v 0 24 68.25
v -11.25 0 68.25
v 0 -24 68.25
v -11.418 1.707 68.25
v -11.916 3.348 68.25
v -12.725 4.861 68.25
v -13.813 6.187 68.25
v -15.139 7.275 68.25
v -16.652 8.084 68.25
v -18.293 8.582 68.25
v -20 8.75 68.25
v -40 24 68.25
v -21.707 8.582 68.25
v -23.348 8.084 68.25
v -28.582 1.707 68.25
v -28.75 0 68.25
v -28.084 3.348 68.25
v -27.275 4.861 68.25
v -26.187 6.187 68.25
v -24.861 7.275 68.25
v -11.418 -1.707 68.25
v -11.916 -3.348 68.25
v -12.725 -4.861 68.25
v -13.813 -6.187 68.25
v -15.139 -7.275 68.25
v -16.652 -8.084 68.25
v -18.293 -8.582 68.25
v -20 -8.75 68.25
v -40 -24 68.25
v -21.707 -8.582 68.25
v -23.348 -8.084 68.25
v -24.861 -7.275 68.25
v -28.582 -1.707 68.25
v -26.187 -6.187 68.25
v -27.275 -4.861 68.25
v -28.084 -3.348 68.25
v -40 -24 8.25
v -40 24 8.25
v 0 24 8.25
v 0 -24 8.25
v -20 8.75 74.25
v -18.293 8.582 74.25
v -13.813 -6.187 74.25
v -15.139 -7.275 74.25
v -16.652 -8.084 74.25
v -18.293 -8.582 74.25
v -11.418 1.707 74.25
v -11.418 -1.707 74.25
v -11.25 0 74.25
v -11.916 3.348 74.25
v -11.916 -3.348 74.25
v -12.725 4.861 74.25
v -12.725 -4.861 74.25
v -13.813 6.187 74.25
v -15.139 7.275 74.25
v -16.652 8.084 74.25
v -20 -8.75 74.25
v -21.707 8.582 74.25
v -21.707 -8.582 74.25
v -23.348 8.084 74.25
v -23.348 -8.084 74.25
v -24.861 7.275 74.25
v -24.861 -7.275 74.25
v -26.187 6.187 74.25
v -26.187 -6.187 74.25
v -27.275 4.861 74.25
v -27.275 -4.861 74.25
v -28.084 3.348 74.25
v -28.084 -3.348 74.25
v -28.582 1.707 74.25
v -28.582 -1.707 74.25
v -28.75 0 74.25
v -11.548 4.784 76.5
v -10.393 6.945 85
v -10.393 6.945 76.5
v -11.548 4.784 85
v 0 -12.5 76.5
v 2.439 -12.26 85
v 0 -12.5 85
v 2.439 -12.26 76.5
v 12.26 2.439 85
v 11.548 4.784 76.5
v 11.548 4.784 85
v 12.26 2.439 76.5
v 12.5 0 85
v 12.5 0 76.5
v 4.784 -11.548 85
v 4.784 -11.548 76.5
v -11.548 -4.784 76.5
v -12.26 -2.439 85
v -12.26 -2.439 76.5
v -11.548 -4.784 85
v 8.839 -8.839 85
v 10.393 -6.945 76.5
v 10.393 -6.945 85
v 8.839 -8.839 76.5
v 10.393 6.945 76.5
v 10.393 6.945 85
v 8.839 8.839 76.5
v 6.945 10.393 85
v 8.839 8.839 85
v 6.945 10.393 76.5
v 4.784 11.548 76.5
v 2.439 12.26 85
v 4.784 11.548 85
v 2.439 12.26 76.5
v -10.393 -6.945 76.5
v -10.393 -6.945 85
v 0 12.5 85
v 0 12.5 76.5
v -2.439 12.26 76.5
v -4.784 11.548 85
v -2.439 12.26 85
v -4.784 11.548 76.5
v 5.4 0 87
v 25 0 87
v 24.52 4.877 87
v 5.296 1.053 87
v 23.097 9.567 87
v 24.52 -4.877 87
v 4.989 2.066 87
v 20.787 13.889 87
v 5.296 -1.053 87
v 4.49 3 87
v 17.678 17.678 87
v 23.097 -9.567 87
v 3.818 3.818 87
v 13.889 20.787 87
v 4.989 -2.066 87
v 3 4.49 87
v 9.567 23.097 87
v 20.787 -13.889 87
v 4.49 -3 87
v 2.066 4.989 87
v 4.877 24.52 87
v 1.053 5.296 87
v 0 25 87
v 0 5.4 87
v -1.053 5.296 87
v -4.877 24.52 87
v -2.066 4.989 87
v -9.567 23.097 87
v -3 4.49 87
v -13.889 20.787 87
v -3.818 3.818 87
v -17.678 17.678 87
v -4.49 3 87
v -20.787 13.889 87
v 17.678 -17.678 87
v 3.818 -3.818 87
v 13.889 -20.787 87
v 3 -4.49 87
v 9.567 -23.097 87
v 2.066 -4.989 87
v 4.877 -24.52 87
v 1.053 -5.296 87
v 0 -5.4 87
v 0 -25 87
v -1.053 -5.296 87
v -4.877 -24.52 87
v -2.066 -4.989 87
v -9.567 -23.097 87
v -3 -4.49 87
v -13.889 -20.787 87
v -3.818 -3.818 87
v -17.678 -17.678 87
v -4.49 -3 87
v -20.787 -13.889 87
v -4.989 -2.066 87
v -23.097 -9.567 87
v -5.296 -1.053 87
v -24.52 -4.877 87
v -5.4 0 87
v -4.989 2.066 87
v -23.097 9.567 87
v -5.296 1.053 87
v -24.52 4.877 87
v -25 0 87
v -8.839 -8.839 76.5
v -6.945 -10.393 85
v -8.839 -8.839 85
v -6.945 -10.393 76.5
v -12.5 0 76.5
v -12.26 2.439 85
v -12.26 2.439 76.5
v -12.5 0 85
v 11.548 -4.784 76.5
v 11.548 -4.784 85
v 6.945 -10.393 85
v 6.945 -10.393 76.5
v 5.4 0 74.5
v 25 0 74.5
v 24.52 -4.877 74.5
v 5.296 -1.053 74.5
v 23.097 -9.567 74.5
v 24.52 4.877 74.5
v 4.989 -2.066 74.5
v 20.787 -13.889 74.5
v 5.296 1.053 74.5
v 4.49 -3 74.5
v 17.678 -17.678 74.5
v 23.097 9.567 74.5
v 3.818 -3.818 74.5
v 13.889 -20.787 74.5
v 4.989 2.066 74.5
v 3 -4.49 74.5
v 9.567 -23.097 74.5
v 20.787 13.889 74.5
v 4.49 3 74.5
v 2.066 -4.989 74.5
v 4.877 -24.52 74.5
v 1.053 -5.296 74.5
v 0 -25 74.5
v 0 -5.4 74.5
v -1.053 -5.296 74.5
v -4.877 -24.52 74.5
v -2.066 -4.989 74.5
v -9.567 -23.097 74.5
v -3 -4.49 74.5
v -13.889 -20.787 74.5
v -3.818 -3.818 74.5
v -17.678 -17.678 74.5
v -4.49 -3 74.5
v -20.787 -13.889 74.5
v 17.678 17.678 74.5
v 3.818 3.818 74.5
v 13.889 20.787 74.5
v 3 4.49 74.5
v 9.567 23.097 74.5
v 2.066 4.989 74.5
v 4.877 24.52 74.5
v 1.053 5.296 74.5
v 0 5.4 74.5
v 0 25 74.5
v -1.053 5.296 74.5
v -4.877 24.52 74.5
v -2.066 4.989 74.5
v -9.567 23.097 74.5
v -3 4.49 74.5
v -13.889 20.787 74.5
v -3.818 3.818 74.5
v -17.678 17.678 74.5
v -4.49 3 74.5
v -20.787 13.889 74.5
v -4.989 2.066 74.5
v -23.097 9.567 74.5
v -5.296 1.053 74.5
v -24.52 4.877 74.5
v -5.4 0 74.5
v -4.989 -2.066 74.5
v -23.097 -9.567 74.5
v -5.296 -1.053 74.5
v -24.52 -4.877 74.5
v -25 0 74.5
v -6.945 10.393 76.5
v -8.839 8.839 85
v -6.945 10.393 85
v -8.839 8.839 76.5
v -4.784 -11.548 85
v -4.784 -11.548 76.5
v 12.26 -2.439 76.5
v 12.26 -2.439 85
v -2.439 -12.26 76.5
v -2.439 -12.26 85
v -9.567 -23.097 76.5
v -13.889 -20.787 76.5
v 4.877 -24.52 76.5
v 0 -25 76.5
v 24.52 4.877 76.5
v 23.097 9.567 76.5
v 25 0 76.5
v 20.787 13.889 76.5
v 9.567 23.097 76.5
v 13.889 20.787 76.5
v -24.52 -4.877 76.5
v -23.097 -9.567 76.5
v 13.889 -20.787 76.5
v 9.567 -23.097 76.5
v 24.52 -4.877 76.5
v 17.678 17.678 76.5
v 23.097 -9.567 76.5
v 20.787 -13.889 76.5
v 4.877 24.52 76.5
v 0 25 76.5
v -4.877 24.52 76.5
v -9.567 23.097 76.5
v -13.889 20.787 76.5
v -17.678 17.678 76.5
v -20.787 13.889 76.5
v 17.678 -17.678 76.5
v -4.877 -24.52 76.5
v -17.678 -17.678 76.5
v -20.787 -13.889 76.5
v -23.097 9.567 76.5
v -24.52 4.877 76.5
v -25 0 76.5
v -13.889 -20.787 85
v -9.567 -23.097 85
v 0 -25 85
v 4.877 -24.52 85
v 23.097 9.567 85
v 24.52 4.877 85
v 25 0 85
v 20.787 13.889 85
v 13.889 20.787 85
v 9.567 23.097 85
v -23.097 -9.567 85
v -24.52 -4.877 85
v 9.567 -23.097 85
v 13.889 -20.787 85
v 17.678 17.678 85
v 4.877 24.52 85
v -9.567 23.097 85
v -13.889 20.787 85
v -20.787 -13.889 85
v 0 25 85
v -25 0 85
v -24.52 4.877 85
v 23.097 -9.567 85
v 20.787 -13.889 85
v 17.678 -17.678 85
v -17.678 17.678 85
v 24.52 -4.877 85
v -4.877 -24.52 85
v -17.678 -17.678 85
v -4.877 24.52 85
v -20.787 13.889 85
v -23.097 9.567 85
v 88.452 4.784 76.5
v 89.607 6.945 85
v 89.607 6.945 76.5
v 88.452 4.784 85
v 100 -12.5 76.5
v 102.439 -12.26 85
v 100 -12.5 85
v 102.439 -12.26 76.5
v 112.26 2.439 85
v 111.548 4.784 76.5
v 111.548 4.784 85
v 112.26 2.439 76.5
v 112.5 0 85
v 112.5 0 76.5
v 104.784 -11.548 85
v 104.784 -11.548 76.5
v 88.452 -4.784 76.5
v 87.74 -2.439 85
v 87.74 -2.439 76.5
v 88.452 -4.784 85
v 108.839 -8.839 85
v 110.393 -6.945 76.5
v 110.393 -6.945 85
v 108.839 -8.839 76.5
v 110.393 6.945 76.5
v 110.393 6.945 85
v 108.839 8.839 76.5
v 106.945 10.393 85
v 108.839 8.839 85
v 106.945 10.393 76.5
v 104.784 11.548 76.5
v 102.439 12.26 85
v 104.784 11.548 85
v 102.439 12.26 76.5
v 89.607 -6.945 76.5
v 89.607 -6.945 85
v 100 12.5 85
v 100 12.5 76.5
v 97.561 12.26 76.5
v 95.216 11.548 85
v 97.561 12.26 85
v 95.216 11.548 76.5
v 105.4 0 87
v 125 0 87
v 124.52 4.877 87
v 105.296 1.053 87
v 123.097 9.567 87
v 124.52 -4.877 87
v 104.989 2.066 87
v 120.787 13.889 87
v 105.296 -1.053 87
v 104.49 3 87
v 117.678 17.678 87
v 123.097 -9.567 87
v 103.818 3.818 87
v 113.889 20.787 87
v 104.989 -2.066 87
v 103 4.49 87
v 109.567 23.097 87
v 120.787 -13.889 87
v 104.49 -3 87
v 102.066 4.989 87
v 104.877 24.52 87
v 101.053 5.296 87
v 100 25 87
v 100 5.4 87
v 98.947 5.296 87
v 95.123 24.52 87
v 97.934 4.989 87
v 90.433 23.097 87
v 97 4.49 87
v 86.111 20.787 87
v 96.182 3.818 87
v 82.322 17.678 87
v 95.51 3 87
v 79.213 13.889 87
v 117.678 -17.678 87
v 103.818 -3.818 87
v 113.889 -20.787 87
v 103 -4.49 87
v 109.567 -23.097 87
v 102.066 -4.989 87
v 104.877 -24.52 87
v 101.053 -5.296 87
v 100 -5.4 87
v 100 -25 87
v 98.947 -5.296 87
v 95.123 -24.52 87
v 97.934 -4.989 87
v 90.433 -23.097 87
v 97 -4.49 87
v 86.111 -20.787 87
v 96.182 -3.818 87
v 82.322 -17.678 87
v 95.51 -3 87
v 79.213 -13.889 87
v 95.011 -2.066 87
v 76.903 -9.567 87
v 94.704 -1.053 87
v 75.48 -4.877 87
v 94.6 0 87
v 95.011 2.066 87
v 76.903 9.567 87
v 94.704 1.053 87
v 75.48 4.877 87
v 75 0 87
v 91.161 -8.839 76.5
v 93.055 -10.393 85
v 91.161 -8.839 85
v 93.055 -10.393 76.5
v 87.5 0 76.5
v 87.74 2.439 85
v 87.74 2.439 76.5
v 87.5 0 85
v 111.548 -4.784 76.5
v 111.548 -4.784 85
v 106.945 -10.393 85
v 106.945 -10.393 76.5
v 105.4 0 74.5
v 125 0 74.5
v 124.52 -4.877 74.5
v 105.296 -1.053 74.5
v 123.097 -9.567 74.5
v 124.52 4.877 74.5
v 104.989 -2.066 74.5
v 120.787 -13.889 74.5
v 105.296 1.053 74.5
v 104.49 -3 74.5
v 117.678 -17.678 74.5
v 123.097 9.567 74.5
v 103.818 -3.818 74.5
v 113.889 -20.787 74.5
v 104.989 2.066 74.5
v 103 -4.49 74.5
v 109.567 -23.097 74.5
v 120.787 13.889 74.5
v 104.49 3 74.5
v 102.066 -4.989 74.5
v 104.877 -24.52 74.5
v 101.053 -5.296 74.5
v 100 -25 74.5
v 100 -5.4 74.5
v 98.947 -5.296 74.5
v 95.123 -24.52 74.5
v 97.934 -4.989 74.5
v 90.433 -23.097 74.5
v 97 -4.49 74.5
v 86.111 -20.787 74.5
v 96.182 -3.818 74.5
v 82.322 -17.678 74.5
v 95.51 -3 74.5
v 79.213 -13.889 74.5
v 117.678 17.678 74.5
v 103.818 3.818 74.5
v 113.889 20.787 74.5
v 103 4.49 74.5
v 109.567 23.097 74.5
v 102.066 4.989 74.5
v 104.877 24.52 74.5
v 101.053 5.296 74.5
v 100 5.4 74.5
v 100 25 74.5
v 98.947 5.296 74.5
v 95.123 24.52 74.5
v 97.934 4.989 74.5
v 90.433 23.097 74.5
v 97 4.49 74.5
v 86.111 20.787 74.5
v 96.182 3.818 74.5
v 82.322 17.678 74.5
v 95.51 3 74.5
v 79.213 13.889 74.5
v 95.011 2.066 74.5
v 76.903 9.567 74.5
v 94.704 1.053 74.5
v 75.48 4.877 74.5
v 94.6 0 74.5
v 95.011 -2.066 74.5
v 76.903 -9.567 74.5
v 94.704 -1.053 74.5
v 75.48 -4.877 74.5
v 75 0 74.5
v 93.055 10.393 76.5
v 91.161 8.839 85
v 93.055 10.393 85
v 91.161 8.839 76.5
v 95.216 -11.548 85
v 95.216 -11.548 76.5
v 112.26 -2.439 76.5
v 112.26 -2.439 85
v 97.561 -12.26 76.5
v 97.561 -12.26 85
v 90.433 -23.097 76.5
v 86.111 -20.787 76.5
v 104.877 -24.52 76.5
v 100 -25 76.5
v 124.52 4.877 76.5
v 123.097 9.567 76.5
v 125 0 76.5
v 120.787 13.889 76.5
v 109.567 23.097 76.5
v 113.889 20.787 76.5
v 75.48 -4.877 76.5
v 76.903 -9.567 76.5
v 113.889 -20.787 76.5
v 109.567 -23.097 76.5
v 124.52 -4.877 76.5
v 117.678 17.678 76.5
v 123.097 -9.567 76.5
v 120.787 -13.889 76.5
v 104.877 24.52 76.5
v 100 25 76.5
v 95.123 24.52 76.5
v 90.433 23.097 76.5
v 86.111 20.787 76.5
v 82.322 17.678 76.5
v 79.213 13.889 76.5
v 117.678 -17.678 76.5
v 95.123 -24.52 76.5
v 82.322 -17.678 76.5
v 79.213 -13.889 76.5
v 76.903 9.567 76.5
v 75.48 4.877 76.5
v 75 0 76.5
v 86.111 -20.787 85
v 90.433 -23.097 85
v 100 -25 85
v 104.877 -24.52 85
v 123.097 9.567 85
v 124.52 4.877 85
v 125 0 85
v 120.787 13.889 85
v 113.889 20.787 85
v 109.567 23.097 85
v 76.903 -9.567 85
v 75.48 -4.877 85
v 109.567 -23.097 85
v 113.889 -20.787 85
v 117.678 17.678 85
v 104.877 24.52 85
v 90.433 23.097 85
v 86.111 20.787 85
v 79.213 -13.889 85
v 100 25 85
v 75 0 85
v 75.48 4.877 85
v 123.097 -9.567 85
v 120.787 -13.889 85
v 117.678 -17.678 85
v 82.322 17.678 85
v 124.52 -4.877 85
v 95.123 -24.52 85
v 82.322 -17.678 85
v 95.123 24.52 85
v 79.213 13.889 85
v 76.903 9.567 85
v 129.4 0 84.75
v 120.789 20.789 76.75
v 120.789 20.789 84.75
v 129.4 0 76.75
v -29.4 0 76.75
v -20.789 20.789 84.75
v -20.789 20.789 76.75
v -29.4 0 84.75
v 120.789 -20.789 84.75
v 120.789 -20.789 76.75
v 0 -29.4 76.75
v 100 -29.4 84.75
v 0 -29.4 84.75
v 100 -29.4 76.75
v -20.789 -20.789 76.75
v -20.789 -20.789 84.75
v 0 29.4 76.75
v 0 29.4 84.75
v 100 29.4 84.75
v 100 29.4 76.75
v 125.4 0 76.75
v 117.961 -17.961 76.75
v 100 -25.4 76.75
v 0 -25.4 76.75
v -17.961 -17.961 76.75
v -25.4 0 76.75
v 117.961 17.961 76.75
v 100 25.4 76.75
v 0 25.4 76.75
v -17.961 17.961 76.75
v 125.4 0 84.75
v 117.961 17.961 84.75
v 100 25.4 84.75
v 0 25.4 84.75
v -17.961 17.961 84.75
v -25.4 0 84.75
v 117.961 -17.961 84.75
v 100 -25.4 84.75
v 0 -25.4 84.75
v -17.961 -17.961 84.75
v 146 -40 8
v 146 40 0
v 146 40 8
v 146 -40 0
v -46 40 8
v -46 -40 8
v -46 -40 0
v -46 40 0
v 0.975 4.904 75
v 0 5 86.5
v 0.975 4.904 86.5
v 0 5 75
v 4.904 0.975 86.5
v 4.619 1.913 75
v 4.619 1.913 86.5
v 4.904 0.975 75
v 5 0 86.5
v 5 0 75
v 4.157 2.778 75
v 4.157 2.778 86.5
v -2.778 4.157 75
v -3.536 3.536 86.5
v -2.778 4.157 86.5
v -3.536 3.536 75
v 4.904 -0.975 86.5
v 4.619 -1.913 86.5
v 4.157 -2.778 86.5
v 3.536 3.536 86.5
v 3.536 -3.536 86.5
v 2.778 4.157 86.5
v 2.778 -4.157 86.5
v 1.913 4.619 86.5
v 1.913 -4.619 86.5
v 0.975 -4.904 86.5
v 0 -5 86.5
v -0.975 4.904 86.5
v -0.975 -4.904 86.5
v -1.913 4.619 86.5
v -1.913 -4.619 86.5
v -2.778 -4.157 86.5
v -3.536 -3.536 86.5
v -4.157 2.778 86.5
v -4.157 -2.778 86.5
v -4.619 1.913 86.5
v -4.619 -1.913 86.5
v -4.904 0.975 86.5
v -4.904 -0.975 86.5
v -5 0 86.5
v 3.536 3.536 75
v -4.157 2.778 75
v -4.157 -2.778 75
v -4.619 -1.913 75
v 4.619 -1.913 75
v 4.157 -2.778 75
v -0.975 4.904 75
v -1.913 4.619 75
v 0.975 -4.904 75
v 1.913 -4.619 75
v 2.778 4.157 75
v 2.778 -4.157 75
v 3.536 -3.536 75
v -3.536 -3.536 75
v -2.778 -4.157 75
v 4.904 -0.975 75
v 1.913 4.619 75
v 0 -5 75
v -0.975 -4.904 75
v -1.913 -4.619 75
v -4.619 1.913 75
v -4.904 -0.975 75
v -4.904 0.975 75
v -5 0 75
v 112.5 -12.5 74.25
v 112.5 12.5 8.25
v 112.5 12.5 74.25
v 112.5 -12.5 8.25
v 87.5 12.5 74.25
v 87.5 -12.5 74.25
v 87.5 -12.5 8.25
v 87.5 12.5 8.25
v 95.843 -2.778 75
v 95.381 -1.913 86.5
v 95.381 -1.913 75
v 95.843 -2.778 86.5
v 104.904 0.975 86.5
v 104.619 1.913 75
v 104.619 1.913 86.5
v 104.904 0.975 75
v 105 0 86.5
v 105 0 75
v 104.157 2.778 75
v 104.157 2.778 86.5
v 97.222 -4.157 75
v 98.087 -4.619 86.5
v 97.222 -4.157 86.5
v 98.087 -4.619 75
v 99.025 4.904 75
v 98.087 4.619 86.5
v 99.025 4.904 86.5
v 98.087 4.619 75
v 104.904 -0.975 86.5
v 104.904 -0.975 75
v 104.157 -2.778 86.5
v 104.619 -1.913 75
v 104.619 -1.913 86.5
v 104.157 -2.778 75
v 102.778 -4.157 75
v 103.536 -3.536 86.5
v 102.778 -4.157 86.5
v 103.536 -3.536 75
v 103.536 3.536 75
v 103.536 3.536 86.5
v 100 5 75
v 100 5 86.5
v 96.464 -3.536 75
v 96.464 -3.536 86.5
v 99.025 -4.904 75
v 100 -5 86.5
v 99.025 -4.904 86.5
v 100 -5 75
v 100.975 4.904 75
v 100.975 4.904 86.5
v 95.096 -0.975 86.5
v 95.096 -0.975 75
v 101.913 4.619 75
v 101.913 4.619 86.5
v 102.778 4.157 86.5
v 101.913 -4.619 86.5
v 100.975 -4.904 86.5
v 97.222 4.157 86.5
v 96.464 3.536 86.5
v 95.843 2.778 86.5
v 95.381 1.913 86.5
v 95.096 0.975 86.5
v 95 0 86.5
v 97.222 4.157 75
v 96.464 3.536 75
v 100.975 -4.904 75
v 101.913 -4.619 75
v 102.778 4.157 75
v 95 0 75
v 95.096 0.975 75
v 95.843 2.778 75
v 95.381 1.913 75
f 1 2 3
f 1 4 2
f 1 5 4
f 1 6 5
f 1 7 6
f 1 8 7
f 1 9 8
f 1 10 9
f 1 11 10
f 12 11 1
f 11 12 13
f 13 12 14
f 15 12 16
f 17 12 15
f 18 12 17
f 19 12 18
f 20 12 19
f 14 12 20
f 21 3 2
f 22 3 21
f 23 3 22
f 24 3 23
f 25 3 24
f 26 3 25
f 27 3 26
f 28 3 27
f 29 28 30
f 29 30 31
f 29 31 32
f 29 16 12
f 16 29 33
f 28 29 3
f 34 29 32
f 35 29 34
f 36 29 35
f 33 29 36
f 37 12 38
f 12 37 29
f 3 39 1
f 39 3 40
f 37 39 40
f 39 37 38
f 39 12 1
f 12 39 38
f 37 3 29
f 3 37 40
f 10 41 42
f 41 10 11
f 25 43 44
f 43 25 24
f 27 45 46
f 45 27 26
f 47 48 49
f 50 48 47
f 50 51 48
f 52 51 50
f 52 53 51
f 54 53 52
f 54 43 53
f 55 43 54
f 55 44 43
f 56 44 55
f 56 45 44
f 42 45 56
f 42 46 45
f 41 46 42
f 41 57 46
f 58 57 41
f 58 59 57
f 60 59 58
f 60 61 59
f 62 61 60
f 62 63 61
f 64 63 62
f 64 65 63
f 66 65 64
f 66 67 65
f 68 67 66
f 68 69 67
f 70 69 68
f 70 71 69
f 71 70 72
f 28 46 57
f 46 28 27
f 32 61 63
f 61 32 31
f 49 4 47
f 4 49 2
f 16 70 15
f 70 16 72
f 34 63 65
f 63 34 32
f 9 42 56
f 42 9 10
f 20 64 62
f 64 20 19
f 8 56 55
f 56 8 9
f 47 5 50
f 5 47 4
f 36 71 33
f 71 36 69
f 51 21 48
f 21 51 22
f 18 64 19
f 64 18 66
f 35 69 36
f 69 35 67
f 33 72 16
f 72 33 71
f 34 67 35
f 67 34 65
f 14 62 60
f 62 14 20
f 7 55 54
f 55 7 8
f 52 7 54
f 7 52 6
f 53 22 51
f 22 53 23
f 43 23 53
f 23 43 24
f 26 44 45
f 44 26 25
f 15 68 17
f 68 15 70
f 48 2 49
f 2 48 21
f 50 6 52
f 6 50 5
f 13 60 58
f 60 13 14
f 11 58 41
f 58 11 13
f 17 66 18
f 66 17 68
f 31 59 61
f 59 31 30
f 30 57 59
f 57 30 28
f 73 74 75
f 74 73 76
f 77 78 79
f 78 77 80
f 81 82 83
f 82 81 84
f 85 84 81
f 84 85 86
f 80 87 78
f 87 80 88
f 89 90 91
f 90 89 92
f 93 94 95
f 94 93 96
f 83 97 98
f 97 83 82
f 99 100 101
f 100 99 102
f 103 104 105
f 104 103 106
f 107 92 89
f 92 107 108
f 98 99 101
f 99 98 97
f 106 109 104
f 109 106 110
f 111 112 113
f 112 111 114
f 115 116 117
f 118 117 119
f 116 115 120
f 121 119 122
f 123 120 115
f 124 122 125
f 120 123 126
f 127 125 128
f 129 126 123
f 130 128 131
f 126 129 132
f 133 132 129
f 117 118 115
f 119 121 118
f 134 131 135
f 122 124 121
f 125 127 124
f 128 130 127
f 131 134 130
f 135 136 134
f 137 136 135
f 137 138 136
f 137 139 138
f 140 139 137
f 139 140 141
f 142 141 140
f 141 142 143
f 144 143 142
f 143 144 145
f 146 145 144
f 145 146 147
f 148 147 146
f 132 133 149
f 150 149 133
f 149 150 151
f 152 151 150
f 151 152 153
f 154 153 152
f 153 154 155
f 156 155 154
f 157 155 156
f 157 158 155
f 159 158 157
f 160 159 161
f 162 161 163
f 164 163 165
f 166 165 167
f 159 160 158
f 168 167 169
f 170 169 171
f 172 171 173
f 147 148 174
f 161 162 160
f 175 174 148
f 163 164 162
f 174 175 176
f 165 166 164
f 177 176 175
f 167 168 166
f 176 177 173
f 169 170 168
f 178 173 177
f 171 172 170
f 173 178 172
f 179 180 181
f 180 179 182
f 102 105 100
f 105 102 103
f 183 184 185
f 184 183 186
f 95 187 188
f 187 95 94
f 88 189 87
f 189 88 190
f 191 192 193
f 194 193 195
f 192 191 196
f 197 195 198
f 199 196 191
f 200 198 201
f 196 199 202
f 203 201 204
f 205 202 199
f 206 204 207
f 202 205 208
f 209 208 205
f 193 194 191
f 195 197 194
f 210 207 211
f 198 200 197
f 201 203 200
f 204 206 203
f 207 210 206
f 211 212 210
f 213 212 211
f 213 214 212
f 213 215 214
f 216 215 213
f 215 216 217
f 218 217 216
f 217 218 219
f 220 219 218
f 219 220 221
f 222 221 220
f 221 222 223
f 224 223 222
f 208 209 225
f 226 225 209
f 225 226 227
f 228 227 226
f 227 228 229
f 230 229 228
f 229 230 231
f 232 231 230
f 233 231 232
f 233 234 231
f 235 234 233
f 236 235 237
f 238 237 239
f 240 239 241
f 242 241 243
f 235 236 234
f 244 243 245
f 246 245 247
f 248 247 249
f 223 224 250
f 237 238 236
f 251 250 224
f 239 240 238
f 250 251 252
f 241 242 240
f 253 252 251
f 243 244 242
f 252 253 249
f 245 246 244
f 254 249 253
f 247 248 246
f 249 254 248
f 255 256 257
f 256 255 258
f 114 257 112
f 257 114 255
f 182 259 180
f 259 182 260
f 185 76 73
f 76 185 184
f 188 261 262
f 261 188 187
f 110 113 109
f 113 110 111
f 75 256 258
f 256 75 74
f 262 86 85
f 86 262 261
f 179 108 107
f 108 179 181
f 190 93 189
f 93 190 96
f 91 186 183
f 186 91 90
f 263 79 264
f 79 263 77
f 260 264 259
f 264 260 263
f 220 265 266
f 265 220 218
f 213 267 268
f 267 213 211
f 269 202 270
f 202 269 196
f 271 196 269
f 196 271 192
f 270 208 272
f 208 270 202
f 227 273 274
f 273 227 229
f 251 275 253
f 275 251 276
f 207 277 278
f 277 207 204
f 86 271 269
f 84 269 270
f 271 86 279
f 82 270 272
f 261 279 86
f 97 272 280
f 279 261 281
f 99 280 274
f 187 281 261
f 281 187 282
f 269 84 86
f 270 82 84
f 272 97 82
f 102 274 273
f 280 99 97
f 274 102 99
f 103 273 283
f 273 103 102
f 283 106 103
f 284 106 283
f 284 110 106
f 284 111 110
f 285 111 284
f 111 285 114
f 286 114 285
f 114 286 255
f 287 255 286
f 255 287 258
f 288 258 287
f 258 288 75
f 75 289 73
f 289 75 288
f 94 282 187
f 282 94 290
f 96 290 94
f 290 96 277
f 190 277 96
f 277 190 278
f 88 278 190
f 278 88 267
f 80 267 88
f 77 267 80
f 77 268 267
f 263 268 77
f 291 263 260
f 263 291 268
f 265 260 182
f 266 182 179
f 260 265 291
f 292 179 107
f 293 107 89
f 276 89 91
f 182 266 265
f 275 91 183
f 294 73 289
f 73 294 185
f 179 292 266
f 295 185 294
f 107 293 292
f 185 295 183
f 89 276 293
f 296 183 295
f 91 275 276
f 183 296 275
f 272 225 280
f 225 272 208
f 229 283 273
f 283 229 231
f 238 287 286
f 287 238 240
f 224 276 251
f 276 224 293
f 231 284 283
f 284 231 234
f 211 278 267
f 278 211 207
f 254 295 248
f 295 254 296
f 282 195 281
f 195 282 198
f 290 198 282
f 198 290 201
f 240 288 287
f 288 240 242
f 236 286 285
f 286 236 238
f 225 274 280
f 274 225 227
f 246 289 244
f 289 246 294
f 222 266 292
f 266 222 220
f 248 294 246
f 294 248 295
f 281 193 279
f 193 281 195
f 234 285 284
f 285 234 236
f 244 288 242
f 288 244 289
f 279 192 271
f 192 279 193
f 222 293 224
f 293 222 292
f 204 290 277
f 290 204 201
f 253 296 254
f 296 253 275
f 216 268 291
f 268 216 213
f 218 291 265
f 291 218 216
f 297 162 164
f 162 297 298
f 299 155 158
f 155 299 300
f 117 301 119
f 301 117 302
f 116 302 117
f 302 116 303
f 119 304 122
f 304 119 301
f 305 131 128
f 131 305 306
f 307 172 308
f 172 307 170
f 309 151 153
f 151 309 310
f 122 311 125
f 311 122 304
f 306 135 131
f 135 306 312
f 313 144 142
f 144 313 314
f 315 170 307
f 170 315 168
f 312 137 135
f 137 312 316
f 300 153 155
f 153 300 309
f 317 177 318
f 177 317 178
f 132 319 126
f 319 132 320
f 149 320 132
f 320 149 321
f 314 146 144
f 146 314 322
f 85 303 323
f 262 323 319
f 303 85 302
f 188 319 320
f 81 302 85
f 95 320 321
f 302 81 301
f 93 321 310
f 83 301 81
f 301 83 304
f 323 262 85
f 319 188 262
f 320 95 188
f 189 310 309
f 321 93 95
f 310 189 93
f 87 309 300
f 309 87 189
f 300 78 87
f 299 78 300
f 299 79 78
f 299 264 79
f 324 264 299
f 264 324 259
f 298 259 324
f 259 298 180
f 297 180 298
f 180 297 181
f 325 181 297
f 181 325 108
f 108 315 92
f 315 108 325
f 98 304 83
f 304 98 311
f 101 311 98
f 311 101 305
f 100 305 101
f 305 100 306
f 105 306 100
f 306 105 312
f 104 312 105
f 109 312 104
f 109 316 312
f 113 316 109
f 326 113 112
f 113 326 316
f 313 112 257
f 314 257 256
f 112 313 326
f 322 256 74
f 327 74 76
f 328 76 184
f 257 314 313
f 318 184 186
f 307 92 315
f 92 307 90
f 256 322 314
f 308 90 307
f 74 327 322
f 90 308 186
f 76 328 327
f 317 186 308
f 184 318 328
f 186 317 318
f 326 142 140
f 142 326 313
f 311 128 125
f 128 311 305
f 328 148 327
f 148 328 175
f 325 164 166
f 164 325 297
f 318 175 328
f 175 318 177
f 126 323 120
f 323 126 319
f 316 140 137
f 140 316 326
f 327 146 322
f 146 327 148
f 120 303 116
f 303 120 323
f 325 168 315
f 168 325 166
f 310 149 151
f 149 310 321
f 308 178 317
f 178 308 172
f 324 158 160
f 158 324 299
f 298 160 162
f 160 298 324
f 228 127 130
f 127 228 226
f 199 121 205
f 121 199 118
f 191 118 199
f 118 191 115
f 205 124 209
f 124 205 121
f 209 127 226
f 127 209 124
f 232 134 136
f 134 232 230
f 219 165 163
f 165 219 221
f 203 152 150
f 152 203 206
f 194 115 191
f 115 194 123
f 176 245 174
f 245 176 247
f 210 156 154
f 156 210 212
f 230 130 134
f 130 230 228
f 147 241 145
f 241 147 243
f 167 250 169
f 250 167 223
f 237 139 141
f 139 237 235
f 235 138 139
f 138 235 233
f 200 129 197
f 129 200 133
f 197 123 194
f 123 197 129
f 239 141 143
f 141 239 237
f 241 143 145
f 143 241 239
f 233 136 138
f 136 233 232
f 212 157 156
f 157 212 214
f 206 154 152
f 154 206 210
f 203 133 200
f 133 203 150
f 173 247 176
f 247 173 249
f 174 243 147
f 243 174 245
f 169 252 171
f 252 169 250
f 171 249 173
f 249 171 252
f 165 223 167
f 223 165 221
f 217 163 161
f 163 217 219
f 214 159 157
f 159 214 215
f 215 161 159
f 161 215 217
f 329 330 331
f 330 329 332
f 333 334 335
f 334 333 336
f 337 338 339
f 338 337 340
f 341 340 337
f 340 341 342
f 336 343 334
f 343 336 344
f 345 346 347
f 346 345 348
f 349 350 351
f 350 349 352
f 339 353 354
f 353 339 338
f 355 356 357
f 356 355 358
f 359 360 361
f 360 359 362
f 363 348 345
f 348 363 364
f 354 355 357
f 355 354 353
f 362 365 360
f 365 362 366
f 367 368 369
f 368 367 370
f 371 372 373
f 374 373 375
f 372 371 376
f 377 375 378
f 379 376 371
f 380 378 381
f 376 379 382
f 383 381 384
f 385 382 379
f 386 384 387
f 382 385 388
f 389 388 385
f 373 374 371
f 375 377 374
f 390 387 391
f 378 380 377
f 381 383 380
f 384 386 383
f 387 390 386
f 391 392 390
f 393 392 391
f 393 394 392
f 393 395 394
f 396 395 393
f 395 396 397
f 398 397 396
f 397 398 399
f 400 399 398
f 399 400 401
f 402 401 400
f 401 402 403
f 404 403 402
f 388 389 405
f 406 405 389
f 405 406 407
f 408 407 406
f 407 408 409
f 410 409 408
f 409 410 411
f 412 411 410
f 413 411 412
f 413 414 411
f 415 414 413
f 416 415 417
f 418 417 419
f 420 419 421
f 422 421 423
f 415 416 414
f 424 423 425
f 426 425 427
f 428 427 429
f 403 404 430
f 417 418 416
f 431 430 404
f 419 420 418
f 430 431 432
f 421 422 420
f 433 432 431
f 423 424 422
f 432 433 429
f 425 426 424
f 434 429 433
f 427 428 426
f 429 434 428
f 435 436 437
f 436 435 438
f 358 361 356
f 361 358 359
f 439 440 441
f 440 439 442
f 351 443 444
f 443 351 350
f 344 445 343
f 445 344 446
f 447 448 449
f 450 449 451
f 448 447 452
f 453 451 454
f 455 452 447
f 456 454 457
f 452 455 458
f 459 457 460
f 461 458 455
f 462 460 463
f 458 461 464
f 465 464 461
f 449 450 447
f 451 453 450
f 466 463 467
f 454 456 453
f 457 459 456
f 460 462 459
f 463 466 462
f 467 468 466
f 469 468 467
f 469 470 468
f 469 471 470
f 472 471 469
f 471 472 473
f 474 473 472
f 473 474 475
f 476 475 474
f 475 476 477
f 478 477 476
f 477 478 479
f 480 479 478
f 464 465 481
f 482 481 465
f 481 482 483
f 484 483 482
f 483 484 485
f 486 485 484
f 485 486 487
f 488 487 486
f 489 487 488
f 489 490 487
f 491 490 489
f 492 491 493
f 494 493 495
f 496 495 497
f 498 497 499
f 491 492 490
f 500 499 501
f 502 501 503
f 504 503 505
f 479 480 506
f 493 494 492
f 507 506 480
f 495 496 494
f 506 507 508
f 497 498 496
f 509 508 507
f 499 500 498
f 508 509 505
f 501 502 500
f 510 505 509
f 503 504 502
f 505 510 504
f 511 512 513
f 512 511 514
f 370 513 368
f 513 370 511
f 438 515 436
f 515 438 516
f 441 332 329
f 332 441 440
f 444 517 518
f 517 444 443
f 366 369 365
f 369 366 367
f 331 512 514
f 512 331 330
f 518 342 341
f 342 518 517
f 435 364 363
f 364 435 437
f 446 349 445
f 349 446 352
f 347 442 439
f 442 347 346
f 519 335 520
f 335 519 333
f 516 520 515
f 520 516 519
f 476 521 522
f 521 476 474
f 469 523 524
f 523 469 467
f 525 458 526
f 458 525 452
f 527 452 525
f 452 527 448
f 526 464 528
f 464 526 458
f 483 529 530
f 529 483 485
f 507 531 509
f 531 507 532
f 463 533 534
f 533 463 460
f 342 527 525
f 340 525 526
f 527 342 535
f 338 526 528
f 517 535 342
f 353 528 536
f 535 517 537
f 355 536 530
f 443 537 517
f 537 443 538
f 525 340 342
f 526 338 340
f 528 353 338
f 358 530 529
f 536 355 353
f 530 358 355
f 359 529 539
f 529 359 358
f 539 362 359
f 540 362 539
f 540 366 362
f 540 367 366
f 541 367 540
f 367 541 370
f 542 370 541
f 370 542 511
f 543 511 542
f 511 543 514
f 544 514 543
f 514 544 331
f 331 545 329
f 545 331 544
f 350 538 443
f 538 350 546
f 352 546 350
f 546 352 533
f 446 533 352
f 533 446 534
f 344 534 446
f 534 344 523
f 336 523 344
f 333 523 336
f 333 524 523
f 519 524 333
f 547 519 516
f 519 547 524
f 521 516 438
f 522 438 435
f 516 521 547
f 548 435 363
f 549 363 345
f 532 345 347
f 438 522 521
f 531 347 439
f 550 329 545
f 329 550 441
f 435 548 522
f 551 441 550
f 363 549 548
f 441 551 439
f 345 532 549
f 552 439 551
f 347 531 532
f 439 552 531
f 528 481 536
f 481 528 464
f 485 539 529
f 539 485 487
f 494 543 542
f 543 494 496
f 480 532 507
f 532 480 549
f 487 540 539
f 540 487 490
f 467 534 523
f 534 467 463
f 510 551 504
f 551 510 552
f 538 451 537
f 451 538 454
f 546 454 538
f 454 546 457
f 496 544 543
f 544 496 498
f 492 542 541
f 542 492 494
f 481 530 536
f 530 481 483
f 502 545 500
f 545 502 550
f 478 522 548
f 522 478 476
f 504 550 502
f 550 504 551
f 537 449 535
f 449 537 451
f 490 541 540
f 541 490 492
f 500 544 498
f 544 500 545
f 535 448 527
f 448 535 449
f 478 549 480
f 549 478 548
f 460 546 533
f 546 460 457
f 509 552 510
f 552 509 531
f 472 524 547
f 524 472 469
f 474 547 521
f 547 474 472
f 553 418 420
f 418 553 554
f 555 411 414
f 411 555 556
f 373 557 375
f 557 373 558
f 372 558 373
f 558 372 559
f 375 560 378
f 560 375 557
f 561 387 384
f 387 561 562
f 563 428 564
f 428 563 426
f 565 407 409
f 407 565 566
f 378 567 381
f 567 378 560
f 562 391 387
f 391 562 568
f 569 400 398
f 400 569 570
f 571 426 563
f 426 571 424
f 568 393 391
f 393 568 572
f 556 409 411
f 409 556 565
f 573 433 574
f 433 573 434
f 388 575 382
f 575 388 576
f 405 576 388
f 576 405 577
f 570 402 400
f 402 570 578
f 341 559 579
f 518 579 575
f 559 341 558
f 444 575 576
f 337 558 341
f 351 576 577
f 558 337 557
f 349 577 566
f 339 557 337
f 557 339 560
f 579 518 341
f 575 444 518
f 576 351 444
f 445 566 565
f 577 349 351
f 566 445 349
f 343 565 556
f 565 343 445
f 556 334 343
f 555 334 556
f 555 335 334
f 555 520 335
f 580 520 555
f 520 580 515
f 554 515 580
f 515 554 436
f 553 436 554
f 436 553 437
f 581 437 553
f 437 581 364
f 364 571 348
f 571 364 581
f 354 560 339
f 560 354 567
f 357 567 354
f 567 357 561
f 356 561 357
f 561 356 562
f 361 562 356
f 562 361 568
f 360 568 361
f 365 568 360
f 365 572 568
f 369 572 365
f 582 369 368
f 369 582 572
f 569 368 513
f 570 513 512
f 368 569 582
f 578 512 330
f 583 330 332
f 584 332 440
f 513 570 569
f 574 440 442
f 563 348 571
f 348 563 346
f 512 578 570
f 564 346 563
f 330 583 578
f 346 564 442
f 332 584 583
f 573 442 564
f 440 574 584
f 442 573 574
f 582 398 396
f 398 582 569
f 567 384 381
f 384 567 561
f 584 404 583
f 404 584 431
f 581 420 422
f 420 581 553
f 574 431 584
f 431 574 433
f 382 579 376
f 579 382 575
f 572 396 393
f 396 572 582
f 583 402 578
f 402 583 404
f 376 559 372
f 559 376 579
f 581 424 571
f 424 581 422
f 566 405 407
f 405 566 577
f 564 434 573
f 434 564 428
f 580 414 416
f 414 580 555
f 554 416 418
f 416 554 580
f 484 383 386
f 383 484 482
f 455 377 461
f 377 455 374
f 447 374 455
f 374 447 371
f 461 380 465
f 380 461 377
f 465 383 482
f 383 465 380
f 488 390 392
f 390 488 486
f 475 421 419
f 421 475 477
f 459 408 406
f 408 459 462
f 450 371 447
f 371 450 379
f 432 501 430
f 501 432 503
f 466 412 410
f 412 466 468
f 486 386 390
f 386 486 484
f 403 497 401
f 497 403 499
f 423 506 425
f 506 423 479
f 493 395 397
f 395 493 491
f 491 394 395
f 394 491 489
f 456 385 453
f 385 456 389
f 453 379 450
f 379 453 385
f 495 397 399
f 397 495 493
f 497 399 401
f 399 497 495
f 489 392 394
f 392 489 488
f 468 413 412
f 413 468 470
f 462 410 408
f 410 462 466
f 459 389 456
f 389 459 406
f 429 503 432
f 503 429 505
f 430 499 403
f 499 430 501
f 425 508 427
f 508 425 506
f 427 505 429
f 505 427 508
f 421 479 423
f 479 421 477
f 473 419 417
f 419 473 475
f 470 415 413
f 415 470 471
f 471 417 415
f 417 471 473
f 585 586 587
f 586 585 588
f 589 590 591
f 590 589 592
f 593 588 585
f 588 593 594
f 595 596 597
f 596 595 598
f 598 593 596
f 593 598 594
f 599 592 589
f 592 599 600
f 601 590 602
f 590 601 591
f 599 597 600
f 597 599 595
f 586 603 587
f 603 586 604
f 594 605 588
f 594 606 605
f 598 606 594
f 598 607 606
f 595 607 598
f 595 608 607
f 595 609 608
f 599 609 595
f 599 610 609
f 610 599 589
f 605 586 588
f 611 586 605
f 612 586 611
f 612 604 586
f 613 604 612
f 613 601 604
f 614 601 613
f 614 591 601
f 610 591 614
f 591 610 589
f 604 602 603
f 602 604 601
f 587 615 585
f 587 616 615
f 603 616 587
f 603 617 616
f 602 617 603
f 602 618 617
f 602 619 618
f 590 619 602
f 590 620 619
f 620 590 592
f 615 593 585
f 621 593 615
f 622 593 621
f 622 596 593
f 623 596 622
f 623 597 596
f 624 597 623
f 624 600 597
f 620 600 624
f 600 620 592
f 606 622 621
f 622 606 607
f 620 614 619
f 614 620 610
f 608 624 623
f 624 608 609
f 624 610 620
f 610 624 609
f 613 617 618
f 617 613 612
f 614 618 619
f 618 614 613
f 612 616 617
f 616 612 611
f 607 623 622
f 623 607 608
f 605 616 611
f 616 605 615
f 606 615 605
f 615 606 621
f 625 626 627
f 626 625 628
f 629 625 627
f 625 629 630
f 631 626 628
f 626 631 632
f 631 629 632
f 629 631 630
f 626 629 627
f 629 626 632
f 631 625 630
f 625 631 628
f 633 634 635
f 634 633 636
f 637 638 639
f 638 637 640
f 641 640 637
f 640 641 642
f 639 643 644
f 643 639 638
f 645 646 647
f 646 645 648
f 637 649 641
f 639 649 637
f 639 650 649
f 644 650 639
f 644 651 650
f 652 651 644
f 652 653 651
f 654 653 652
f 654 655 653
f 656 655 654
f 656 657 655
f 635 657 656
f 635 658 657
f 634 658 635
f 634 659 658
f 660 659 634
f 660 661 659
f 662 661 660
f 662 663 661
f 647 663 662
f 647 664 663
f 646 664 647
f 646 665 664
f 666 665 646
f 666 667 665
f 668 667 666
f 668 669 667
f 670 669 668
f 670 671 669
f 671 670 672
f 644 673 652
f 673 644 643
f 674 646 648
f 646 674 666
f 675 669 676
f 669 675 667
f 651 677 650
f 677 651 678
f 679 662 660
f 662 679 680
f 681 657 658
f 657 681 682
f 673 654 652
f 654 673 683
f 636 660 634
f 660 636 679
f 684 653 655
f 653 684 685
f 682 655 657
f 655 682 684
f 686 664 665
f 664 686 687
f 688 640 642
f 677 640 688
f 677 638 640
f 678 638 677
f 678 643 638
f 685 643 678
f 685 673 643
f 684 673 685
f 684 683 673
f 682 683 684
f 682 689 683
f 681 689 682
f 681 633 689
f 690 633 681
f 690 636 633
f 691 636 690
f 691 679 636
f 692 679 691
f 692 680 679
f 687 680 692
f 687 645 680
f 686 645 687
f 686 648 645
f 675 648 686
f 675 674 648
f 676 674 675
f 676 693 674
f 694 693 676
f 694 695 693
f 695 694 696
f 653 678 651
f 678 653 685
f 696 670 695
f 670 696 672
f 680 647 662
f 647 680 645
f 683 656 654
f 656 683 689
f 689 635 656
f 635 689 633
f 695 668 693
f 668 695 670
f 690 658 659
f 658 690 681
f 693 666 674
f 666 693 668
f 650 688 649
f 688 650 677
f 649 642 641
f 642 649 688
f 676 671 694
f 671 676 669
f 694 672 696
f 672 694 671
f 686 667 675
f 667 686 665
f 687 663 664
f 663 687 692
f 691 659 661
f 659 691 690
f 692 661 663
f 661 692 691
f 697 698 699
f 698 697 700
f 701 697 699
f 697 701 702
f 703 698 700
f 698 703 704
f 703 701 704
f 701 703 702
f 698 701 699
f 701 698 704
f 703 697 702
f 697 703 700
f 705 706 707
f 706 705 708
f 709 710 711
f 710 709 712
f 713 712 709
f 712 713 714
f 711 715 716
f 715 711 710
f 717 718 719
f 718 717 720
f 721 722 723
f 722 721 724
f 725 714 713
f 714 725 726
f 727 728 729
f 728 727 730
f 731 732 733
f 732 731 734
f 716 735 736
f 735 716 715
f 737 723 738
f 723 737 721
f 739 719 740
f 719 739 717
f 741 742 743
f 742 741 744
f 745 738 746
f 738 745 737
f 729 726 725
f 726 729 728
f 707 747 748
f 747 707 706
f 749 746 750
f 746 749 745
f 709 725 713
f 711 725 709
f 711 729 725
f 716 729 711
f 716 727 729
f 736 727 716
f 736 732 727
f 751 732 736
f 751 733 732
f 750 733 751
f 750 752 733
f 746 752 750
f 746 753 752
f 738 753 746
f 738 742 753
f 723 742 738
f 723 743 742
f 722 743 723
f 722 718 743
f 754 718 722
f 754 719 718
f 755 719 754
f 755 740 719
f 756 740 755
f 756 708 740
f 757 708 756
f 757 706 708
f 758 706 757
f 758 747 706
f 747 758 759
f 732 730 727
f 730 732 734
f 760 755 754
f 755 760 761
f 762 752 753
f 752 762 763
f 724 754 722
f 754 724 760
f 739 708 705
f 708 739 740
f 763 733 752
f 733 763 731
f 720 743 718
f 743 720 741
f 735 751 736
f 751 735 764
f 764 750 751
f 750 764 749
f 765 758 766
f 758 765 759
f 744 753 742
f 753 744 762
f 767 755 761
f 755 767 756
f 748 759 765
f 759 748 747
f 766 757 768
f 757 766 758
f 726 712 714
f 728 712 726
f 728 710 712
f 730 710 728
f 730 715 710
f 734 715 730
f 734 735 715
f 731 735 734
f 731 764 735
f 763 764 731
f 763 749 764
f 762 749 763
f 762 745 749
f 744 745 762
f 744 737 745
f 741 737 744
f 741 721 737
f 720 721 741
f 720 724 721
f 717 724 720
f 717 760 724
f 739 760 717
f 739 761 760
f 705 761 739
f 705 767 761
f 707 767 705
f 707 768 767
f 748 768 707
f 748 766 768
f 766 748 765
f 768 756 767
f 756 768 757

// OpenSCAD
$fn = 32;

// ------------------------------------------------------------------------
// Motor belt drive: span 100 mm, pulleys d50, belt 8 mm wide
// Every part is its own module, assembly() places every instance.
// ------------------------------------------------------------------------

// --- part 1 ---
module base_plate() {
  difference() {
    translate([-96, -40, 0]) cube([192, 80, 8]);
  }
}

// --- part 2 ---
module motor() {
  union() {
    translate([-30, -24, 0]) cube([60, 48, 40]);
    translate([33, 0, 20]) rotate([0, 90, 0]) cylinder(h = 6, d = 17.5, center = true);
  }
}

// --- part 3 ---
module drive_shaft() {
  translate([0, 0, -5.75]) cylinder(h = 11.5, d = 10);
}

// --- part 4 ---
module pulley_drive() {
  difference() {
    union() {
      cylinder(h = 12.5, d = 25);
      cylinder(h = 2, d = 50);
      translate([0, 0, 10.5]) cylinder(h = 2, d = 50);
    }
    translate([0, 0, -1]) cylinder(h = 14.5, d = 10.8);
  }
}

// --- part 5 ---
module idler_post() {
  translate([-12.5, -12.5, 0]) cube([25, 25, 66]);
}

// --- part 6 ---
module driven_shaft() {
  translate([0, 0, -5.75]) cylinder(h = 11.5, d = 10);
}

// --- part 7 ---
module pulley_driven() {
  difference() {
    union() {
      cylinder(h = 12.5, d = 25);
      cylinder(h = 2, d = 50);
      translate([0, 0, 10.5]) cylinder(h = 2, d = 50);
    }
    translate([0, 0, -1]) cylinder(h = 14.5, d = 10.8);
  }
}

// --- part 8 ---
module drive_belt() {
  difference() {
    linear_extrude(height = 8) polygon(points = concat([for (a = [90 : 45 : 270]) [29.4 * cos(a), 29.4 * sin(a)]], [for (a = [270 : 45 : 450]) [100 + 29.4 * cos(a), 29.4 * sin(a)]]));
    translate([0, 0, -1]) linear_extrude(height = 10) polygon(points = concat([for (a = [90 : 45 : 270]) [25.4 * cos(a), 25.4 * sin(a)]], [for (a = [270 : 45 : 450]) [100 + 25.4 * cos(a), 25.4 * sin(a)]]));
  }
}

// --- assembly ---
module assembly() {
  color([0.80, 0.24, 0.20]) translate([50, 0, 0]) rotate([0, 0, 0]) base_plate();
  color([0.20, 0.45, 0.75]) translate([0, 0, 38.25]) rotate([0, 270, 0]) motor();
  color([0.25, 0.62, 0.32]) translate([0, 0, 80.75]) rotate([0, 0, 0]) drive_shaft();
  color([0.92, 0.70, 0.18]) translate([0, 0, 74.5]) rotate([0, 0, 0]) pulley_drive();
  color([0.58, 0.35, 0.70]) translate([100, 0, 8.25]) rotate([0, 0, 0]) idler_post();
  color([0.16, 0.66, 0.66]) translate([100, 0, 80.75]) rotate([0, 0, 0]) driven_shaft();
  color([0.85, 0.48, 0.18]) translate([100, 0, 74.5]) rotate([0, 0, 0]) pulley_driven();
  color([0.55, 0.60, 0.65]) translate([0, 0, 76.75]) rotate([0, 0, 0]) drive_belt();
}

assembly();
